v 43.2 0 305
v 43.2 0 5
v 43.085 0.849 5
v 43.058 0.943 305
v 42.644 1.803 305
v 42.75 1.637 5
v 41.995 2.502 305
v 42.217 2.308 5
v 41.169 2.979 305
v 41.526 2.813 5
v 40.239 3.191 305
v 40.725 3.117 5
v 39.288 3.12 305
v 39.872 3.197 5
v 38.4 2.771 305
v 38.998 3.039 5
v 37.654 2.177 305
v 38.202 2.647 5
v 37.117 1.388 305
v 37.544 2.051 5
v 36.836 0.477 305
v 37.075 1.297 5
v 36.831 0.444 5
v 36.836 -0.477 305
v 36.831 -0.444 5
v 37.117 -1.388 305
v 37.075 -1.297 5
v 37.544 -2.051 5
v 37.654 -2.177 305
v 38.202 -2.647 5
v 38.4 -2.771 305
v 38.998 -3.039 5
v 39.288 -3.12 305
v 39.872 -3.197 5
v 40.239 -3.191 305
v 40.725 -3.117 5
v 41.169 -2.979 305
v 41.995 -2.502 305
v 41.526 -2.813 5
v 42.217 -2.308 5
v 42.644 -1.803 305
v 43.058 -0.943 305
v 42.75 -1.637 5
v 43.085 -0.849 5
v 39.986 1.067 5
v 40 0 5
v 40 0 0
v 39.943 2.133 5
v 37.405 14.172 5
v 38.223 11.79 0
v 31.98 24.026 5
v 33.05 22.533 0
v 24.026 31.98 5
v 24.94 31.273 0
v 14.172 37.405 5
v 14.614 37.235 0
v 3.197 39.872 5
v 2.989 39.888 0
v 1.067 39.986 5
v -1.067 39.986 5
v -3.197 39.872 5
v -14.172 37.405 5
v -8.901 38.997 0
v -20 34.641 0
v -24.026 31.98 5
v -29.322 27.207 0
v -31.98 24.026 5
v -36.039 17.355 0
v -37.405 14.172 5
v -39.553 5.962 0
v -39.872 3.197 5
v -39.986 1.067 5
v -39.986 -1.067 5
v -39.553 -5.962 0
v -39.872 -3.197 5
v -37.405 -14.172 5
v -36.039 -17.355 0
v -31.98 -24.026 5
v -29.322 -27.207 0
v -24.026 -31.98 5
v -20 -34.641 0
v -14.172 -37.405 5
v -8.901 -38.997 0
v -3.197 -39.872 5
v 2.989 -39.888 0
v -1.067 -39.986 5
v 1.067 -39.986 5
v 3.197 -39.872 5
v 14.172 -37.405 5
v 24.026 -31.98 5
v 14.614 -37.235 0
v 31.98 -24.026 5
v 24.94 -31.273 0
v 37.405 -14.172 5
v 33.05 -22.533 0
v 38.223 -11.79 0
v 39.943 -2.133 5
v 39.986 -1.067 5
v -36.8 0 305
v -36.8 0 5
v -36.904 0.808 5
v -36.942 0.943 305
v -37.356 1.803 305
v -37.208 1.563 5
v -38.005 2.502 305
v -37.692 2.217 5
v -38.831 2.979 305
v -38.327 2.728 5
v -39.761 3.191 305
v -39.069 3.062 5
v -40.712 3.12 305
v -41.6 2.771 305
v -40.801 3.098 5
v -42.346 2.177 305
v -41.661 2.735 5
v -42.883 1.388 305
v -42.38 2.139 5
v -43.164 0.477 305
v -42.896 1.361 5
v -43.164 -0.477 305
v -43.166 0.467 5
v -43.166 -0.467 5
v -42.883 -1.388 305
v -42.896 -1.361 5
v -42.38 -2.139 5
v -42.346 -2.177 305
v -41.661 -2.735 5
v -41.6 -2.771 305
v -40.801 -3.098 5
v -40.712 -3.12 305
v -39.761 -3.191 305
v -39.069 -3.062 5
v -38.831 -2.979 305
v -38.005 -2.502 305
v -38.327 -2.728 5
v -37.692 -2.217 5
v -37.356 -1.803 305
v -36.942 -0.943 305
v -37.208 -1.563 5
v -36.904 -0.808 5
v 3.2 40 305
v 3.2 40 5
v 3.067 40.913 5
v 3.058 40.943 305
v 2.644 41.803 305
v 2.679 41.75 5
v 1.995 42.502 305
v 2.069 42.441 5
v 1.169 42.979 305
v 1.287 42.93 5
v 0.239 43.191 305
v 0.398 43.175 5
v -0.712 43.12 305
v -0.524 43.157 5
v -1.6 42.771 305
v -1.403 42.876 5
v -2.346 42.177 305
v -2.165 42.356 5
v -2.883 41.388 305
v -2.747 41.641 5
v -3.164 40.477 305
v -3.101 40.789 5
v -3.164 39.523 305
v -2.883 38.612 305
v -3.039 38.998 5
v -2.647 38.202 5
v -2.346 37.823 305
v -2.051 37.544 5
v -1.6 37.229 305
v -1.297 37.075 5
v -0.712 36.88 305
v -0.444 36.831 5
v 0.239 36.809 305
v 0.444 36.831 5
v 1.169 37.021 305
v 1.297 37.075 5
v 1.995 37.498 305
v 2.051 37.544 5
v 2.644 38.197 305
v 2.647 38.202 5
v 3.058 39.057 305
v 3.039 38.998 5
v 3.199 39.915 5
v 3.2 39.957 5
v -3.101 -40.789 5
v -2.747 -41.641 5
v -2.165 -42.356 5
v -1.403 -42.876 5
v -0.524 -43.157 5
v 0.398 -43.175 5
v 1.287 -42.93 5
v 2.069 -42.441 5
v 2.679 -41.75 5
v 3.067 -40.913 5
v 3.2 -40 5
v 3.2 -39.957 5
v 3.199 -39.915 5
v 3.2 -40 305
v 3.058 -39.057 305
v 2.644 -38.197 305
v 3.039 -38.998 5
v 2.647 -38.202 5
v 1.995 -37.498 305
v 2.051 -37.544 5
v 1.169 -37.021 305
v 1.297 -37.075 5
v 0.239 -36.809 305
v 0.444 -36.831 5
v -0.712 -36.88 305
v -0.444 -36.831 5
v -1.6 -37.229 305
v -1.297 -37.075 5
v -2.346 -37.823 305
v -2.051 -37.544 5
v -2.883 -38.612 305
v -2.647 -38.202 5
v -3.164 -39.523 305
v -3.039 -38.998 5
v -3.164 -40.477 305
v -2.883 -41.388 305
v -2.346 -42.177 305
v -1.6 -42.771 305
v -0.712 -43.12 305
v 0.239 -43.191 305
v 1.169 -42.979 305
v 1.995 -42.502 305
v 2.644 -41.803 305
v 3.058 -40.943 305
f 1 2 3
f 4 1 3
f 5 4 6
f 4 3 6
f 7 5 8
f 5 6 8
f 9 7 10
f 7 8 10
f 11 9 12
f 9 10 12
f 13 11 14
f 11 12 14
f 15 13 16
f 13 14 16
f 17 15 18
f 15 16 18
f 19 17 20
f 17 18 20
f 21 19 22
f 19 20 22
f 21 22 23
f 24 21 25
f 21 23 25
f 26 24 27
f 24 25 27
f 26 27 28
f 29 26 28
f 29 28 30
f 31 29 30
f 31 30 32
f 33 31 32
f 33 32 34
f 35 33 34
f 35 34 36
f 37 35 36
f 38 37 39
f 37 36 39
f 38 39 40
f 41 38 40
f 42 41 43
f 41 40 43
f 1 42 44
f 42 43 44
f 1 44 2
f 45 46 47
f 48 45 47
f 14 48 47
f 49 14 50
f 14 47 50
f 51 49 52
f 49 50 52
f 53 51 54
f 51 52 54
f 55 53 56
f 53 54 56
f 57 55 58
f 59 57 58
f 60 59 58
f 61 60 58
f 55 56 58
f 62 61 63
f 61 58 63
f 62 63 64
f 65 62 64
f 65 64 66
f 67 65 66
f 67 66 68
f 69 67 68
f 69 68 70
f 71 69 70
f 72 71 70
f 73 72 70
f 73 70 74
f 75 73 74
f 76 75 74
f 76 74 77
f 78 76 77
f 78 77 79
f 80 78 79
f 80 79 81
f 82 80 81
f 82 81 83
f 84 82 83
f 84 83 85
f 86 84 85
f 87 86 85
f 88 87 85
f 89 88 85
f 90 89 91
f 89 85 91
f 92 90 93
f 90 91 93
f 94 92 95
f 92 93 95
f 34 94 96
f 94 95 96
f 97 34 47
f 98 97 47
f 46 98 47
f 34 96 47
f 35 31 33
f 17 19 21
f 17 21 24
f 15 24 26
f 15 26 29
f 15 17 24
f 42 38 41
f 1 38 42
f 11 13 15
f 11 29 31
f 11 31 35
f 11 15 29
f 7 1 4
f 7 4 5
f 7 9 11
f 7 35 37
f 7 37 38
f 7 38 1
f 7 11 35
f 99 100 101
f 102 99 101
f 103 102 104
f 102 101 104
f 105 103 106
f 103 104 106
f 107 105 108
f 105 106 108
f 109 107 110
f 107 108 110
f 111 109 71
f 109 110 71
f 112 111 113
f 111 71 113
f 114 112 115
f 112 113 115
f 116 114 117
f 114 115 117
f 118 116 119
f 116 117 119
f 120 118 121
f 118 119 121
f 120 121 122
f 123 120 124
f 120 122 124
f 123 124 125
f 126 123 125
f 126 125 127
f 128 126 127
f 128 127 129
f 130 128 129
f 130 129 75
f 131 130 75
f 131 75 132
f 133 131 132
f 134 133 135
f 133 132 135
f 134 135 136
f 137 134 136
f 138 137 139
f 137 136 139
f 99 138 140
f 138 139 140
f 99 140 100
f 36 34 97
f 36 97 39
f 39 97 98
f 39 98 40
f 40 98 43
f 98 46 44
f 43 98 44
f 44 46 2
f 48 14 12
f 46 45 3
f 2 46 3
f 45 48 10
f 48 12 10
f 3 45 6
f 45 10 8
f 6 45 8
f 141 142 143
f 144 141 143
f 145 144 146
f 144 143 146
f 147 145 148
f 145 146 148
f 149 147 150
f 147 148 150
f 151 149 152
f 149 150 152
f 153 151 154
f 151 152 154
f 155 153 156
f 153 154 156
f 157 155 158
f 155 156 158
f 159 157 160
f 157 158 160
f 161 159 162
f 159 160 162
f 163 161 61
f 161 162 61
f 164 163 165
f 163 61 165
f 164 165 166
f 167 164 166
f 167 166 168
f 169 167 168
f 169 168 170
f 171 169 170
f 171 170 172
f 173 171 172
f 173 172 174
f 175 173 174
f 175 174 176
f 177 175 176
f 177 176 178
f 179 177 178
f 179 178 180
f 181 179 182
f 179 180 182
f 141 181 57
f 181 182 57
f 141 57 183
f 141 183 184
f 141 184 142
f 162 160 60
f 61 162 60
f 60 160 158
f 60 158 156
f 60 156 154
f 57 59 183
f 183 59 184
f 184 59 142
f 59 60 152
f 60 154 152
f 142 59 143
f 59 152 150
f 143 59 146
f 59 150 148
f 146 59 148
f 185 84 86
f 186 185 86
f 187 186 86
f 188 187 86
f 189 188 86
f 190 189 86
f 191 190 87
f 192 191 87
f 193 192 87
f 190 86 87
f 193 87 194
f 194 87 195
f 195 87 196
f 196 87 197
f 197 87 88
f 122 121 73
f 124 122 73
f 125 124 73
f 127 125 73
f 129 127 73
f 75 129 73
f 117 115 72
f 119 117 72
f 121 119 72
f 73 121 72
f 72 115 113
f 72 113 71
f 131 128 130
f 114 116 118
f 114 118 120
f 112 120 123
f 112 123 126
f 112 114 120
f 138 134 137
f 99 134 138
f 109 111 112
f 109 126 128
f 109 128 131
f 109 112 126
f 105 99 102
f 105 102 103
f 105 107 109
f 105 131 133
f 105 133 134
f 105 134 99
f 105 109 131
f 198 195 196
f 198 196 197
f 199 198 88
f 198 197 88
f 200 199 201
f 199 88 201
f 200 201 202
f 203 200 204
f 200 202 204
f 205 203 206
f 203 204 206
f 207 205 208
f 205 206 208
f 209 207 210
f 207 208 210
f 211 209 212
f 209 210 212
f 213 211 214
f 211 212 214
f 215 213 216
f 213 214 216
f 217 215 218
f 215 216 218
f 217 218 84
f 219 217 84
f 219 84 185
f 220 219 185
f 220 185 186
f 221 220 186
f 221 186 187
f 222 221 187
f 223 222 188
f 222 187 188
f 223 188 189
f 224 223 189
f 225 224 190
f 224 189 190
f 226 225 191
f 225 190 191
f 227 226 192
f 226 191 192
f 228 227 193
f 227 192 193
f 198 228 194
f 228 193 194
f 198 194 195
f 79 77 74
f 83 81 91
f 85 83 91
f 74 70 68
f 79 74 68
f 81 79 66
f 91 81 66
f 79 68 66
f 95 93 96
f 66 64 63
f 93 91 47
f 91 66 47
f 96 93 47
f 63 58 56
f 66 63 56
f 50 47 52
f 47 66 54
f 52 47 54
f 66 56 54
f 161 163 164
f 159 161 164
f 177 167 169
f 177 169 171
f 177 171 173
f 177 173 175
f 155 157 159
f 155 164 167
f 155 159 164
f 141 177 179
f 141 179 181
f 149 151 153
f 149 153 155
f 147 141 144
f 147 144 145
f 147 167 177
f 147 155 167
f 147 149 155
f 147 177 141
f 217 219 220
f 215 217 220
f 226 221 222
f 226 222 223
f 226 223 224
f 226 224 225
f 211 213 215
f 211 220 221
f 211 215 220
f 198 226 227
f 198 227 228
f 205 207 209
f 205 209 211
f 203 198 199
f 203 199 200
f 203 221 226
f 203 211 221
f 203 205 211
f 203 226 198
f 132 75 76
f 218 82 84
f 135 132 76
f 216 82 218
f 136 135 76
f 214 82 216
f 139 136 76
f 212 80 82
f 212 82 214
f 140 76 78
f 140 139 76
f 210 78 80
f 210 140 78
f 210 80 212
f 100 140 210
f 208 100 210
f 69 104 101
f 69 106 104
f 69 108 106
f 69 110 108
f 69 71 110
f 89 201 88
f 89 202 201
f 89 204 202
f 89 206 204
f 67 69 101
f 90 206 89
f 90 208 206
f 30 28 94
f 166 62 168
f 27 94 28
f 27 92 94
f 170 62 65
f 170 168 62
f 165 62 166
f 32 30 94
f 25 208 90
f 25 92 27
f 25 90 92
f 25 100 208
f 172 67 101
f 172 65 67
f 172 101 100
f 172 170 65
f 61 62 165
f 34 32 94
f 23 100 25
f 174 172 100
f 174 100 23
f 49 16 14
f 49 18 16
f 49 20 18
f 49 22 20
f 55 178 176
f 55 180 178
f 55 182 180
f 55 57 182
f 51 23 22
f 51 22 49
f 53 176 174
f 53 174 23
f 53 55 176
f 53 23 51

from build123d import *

# Parameters (mm, degrees)
F0_R     = 40
F1_DEPTH = 5
F2_R     = 3.2
F3_DEPTH = 300


with BuildPart() as f1:
    # F0 (on Top) → F1 (new body)
    with BuildSketch(Plane.XY):
        Circle(F0_R)
    extrude(amount=F1_DEPTH)

    # F2 (on face) → F3 (join)
    with BuildSketch(Plane.XY.offset(5)):
        with Locations((0, 40)):
            Circle(F2_R)
        with Locations((-40, 0)):
            Circle(F2_R)
        with Locations((0, -40)):
            Circle(F2_R)
        with Locations((40, 0)):
            Circle(F2_R)
    extrude(amount=F3_DEPTH)


solid = f1.part
